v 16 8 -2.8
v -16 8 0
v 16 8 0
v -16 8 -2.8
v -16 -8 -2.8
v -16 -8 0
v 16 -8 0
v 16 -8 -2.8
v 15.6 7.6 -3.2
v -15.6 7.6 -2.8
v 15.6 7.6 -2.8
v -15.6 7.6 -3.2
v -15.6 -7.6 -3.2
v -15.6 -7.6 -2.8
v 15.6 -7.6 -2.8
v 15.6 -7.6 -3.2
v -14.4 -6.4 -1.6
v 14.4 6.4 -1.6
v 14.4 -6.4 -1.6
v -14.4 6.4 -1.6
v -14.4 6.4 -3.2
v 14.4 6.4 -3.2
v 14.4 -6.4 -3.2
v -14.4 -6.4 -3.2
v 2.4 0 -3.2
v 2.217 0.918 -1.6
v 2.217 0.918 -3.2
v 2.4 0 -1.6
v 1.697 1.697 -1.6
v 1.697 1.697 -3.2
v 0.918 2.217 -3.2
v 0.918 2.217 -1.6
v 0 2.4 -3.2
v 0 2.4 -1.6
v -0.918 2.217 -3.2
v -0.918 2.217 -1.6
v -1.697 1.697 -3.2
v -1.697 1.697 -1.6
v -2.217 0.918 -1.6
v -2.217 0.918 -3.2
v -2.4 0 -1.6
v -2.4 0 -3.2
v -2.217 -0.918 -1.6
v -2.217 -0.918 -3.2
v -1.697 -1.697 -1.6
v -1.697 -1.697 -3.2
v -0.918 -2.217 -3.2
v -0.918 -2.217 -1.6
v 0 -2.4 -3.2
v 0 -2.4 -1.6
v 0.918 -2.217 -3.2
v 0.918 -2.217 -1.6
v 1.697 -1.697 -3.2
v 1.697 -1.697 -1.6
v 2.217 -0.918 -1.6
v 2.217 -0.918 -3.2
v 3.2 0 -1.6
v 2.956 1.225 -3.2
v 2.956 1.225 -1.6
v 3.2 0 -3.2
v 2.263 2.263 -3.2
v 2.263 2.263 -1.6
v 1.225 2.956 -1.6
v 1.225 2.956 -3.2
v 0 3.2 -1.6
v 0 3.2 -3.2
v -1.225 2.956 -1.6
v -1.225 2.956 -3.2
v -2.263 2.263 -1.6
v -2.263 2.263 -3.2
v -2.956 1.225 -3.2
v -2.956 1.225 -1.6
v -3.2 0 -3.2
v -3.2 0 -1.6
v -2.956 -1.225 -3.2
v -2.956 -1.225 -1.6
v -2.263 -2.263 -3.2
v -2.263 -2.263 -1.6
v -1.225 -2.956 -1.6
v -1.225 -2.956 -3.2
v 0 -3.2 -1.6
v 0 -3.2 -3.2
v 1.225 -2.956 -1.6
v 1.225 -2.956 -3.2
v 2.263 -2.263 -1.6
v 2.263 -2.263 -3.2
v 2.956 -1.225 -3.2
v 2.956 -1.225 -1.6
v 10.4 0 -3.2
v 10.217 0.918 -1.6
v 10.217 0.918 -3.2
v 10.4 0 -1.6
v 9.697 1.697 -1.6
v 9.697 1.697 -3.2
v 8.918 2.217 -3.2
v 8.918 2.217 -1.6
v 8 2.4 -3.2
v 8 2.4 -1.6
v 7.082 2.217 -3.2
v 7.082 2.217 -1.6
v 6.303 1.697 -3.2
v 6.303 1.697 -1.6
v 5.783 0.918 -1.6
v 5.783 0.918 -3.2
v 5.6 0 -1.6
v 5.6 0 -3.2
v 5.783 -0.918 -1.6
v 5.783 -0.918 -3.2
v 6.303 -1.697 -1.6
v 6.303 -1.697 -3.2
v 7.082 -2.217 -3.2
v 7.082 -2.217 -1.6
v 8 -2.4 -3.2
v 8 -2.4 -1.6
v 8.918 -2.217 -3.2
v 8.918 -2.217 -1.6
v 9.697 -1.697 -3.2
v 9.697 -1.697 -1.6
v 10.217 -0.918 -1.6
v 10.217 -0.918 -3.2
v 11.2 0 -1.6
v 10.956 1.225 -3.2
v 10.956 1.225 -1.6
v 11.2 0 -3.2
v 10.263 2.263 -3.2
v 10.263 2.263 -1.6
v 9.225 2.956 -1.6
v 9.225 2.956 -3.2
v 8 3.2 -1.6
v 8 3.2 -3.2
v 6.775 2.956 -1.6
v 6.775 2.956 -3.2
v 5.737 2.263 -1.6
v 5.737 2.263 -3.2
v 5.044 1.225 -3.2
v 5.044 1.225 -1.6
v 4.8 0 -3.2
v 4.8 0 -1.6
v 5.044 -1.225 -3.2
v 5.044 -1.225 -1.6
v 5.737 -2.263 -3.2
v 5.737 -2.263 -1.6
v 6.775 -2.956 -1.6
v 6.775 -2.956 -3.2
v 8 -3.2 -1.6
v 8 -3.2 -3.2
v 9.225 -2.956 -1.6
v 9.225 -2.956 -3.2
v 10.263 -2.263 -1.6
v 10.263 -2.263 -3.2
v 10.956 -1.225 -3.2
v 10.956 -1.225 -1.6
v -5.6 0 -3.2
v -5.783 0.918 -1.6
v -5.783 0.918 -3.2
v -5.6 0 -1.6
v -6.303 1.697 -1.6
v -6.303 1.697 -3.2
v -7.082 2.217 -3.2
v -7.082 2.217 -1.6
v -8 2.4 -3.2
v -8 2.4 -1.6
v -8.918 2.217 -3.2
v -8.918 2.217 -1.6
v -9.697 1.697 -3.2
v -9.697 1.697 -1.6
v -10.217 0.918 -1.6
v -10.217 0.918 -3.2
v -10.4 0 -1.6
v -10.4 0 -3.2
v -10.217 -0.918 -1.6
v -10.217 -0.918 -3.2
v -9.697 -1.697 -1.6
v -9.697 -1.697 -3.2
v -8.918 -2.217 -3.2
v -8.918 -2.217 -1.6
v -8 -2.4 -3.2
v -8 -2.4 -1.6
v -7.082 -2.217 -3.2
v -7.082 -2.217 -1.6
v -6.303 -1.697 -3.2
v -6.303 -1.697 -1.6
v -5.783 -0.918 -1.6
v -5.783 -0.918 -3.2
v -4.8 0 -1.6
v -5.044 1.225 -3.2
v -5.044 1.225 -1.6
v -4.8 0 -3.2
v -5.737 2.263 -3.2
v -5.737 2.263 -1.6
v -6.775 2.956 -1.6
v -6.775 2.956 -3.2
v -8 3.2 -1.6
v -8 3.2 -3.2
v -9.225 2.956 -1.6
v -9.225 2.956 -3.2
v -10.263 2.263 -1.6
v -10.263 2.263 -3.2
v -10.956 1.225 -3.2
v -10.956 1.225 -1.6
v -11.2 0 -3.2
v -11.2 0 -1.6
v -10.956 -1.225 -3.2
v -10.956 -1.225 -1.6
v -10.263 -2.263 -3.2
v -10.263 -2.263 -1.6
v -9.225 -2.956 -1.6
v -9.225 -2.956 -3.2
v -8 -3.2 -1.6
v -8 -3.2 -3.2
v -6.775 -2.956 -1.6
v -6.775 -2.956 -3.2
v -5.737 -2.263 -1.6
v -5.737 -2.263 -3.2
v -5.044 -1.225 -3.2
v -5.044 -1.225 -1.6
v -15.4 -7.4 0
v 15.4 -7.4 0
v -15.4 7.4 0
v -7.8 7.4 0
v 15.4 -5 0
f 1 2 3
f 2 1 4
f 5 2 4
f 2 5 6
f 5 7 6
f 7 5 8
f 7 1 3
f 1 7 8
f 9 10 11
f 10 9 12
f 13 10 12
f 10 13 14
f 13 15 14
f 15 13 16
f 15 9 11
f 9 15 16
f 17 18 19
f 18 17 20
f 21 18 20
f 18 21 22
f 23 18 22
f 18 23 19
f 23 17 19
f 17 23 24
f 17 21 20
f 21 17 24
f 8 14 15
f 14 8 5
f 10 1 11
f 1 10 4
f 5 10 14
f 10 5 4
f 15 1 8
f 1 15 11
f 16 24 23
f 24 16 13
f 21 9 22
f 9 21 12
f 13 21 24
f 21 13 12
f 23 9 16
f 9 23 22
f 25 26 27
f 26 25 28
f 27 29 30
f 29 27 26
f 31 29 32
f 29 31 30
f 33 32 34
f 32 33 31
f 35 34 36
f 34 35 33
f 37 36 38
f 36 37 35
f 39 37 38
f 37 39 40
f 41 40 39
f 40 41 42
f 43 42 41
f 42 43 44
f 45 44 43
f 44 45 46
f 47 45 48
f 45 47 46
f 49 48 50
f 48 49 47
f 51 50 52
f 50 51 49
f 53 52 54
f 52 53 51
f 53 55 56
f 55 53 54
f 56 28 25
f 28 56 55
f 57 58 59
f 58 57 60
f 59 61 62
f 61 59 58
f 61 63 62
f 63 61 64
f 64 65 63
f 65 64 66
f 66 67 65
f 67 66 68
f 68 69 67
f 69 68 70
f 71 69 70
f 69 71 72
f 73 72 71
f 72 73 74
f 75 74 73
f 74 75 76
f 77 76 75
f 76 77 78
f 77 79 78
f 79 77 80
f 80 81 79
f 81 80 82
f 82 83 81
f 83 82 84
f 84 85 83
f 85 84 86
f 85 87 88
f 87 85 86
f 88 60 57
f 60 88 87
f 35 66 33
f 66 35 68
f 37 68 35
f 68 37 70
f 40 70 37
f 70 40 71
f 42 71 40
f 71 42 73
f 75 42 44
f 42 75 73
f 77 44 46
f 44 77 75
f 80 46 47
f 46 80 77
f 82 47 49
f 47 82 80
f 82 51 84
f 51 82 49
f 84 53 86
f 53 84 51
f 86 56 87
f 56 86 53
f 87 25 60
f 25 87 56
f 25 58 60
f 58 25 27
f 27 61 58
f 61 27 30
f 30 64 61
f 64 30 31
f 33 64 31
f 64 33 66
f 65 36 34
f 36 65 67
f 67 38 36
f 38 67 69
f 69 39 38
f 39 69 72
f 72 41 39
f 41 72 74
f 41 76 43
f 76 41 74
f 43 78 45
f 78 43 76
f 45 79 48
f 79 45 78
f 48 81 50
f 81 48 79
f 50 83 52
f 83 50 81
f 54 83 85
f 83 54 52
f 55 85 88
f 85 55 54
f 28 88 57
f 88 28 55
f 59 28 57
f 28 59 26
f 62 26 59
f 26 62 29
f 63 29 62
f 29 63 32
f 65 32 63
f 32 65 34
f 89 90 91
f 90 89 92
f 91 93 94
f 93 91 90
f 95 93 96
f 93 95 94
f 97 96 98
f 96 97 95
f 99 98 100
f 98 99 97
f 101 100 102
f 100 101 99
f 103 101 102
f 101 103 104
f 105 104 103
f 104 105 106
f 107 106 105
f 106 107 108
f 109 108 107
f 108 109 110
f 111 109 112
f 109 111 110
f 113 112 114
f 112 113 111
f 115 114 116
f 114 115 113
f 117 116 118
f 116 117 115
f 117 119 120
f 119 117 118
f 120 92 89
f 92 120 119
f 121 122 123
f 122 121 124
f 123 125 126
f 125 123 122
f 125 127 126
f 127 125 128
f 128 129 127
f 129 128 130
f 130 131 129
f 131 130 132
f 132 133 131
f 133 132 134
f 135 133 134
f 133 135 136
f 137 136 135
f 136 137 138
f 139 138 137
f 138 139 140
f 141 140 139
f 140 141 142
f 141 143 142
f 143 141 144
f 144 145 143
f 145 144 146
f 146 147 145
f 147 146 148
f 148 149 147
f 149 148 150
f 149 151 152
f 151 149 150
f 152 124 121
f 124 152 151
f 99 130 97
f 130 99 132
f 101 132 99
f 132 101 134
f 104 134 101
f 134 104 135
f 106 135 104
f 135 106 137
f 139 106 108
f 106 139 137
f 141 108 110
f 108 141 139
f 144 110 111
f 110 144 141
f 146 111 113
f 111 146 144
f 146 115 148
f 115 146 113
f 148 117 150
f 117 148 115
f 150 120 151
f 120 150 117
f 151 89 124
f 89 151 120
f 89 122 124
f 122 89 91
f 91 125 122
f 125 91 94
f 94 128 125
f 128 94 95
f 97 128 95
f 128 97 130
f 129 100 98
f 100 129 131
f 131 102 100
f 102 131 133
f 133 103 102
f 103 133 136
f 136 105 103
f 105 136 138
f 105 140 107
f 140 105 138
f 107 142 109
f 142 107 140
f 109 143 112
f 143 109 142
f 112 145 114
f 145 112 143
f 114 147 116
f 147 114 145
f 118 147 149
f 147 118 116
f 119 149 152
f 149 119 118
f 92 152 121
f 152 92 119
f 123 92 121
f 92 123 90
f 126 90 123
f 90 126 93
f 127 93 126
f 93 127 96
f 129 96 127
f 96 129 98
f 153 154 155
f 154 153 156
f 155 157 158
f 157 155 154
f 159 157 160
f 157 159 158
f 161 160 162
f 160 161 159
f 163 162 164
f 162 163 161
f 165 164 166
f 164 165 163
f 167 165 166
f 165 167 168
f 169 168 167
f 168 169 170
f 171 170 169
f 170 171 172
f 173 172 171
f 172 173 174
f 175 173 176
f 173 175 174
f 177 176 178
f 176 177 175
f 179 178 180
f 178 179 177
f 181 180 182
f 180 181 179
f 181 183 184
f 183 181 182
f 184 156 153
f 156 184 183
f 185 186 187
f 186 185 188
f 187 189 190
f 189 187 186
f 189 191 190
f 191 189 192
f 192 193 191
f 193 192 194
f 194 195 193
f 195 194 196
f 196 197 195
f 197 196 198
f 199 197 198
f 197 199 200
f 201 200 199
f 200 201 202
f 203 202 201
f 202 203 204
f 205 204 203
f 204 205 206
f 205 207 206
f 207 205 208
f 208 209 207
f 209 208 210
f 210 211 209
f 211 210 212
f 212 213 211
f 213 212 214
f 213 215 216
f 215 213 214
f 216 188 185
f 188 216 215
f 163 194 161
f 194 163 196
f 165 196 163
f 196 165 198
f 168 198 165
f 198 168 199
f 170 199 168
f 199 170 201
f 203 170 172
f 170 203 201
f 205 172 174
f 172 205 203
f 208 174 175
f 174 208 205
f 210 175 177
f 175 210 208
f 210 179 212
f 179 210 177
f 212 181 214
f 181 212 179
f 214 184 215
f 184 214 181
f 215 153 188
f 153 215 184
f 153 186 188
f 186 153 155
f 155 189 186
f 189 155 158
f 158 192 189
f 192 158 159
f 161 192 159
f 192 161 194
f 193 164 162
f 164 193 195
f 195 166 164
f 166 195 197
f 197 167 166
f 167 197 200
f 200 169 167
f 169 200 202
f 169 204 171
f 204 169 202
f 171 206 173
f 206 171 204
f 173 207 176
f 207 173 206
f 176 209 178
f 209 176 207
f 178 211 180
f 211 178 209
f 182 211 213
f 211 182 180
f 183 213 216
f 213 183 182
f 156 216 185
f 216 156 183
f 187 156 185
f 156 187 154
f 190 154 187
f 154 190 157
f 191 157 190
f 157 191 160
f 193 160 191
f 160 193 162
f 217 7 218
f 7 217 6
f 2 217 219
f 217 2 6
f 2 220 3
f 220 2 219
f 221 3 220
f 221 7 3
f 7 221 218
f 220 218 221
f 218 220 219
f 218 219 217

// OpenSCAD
// file: ../p/4-4ring3.scad
use <../lib.scad>
$fa=1; $fs=0.2;
function ldraw_lib__4_4ring3(realsolid=false) = [
// 0 Ring  3 x 1.0
// 0 Name: 4-4ring3.dat
// 0 Author: James Jessiman
// 0 !LDRAW_ORG Primitive UPDATE 2009-01
// 0 !LICENSE Licensed under CC BY 2.0 and CC BY 4.0 : see CAreadme.txt
// 
// 0 BFC CERTIFY CCW
  [0,"BFC","CERTIFY"],
  [0,"BFC","CCW"],
// 
// 0 !HISTORY 1998-12-15 [PTadmin] Official Update 1998-10
// 0 !HISTORY 2002-04-05 [hafhead] Added BFC statement
// 0 !HISTORY 2002-04-25 [PTadmin] Official Update 2002-02
// 0 !HISTORY 2007-06-24 [PTadmin] Header formatted for Contributor Agreement
// 0 !HISTORY 2008-07-01 [PTadmin] Official Update 2008-01
// 0 !HISTORY 2008-08-26 [cwdee] Switch polygon winding and rename
// 0 !HISTORY 2009-05-02 [PTadmin] Official Update 2009-01
// 
// 
// 4 16 -1.5308 0 3.6956 -1.1481 0 2.7717 0 0 3 0 0 4
  [4,16,-1.5308,0,3.6956,-1.1481,0,2.7717,0,0,3,0,0,4],
// 4 16 -2.8284 0 2.8284 -2.1213 0 2.1213 -1.1481 0 2.7717 -1.5308 0 3.6956
  [4,16,-2.8284,0,2.8284,-2.1213,0,2.1213,-1.1481,0,2.7717,-1.5308,0,3.6956],
// 4 16 -3.6956 0 1.5308 -2.7717 0 1.1481 -2.1213 0 2.1213 -2.8284 0 2.8284
  [4,16,-3.6956,0,1.5308,-2.7717,0,1.1481,-2.1213,0,2.1213,-2.8284,0,2.8284],
// 4 16 -4 0 0 -3 0 0 -2.7717 0 1.1481 -3.6956 0 1.5308
  [4,16,-4,0,0,-3,0,0,-2.7717,0,1.1481,-3.6956,0,1.5308],
// 4 16 -3.6956 0 -1.5308 -2.7717 0 -1.1481 -3 0 0 -4 0 0
  [4,16,-3.6956,0,-1.5308,-2.7717,0,-1.1481,-3,0,0,-4,0,0],
// 4 16 -2.8284 0 -2.8284 -2.1213 0 -2.1213 -2.7717 0 -1.1481 -3.6956 0 -1.5308
  [4,16,-2.8284,0,-2.8284,-2.1213,0,-2.1213,-2.7717,0,-1.1481,-3.6956,0,-1.5308],
// 4 16 -1.5308 0 -3.6956 -1.1481 0 -2.7717 -2.1213 0 -2.1213 -2.8284 0 -2.8284
  [4,16,-1.5308,0,-3.6956,-1.1481,0,-2.7717,-2.1213,0,-2.1213,-2.8284,0,-2.8284],
// 4 16 0 0 -4 0 0 -3 -1.1481 0 -2.7717 -1.5308 0 -3.6956
  [4,16,0,0,-4,0,0,-3,-1.1481,0,-2.7717,-1.5308,0,-3.6956],
// 4 16 1.5308 0 -3.6956 1.1481 0 -2.7717 0 0 -3 0 0 -4
  [4,16,1.5308,0,-3.6956,1.1481,0,-2.7717,0,0,-3,0,0,-4],
// 4 16 2.8284 0 -2.8284 2.1213 0 -2.1213 1.1481 0 -2.7717 1.5308 0 -3.6956
  [4,16,2.8284,0,-2.8284,2.1213,0,-2.1213,1.1481,0,-2.7717,1.5308,0,-3.6956],
// 4 16 3.6956 0 -1.5308 2.7717 0 -1.1481 2.1213 0 -2.1213 2.8284 0 -2.8284
  [4,16,3.6956,0,-1.5308,2.7717,0,-1.1481,2.1213,0,-2.1213,2.8284,0,-2.8284],
// 4 16 4 0 0 3 0 0 2.7717 0 -1.1481 3.6956 0 -1.5308
  [4,16,4,0,0,3,0,0,2.7717,0,-1.1481,3.6956,0,-1.5308],
// 4 16 3.6956 0 1.5308 2.7717 0 1.1481 3 0 0 4 0 0
  [4,16,3.6956,0,1.5308,2.7717,0,1.1481,3,0,0,4,0,0],
// 4 16 2.8284 0 2.8284 2.1213 0 2.1213 2.7717 0 1.1481 3.6956 0 1.5308
  [4,16,2.8284,0,2.8284,2.1213,0,2.1213,2.7717,0,1.1481,3.6956,0,1.5308],
// 4 16 1.5308 0 3.6956 1.1481 0 2.7717 2.1213 0 2.1213 2.8284 0 2.8284
  [4,16,1.5308,0,3.6956,1.1481,0,2.7717,2.1213,0,2.1213,2.8284,0,2.8284],
// 4 16 0 0 4 0 0 3 1.1481 0 2.7717 1.5308 0 3.6956
  [4,16,0,0,4,0,0,3,1.1481,0,2.7717,1.5308,0,3.6956],
// 0
];
module ldraw_lib__4_4ring3(step=0, col=false, unit=2/5, alt=false, line=0.2, solid=!$preview)
    makepoly(ldraw_lib__4_4ring3(solid), step=step, col=col, unit=unit, alt=alt, line=line, solid=solid);
ldraw_lib__4_4ring3(line=0.2);
// file: ../p/4-4edge.scad
use <../lib.scad>
function ldraw_lib__4_4edge() = [
// 0 Circle 1.0
// 0 Name: 4-4edge.dat
// 0 Author: James Jessiman
// 0 !LDRAW_ORG Primitive UPDATE 2017-01
// 0 !LICENSE Licensed under CC BY 2.0 and CC BY 4.0 : see CAreadme.txt
// 
// 0 BFC CERTIFY CCW
  [0,"BFC","CERTIFY"],
  [0,"BFC","CCW"],
// 
// 0 !HISTORY 1998-12-15 [PTadmin] Official Update 1998-10
// 0 !HISTORY 2005-12-28 [PTadmin] Official Update 2005-01
// 0 !HISTORY 2007-06-24 [PTadmin] Header formatted for Contributor Agreement
// 0 !HISTORY 2008-07-01 [PTadmin] Official Update 2008-01
// 0 !HISTORY 2017-01-15 [Steffen] BFCed
// 0 !HISTORY 2017-12-30 [PTadmin] Official Update 2017-01
// 
// 
// 2 24 1 0 0 0.9239 0 0.3827
  [2,24,1,0,0,0.9239,0,0.3827],
// 2 24 0.9239 0 0.3827 0.7071 0 0.7071
  [2,24,0.9239,0,0.3827,0.7071,0,0.7071],
// 2 24 0.7071 0 0.7071 0.3827 0 0.9239
  [2,24,0.7071,0,0.7071,0.3827,0,0.9239],
// 2 24 0.3827 0 0.9239 0 0 1
  [2,24,0.3827,0,0.9239,0,0,1],
// 2 24 0 0 1 -0.3827 0 0.9239
  [2,24,0,0,1,-0.3827,0,0.9239],
// 2 24 -0.3827 0 0.9239 -0.7071 0 0.7071
  [2,24,-0.3827,0,0.9239,-0.7071,0,0.7071],
// 2 24 -0.7071 0 0.7071 -0.9239 0 0.3827
  [2,24,-0.7071,0,0.7071,-0.9239,0,0.3827],
// 2 24 -0.9239 0 0.3827 -1 0 -0
  [2,24,-0.9239,0,0.3827,-1,0,-0],
// 2 24 -1 0 -0 -0.9239 0 -0.3827
  [2,24,-1,0,-0,-0.9239,0,-0.3827],
// 2 24 -0.9239 0 -0.3827 -0.7071 0 -0.7071
  [2,24,-0.9239,0,-0.3827,-0.7071,0,-0.7071],
// 2 24 -0.7071 0 -0.7071 -0.3827 0 -0.9239
  [2,24,-0.7071,0,-0.7071,-0.3827,0,-0.9239],
// 2 24 -0.3827 0 -0.9239 0 0 -1
  [2,24,-0.3827,0,-0.9239,0,0,-1],
// 2 24 0 0 -1 0.3827 0 -0.9239
  [2,24,0,0,-1,0.3827,0,-0.9239],
// 2 24 0.3827 0 -0.9239 0.7071 0 -0.7071
  [2,24,0.3827,0,-0.9239,0.7071,0,-0.7071],
// 2 24 0.7071 0 -0.7071 0.9239 0 -0.3827
  [2,24,0.7071,0,-0.7071,0.9239,0,-0.3827],
// 2 24 0.9239 0 -0.3827 1 0 0
  [2,24,0.9239,0,-0.3827,1,0,0],
];
module ldraw_lib__4_4edge(step=0, col=false, unit=2/5, alt=false, line=0.2, solid=!$preview)
    makepoly(ldraw_lib__4_4edge(), step=step, col=col, unit=unit, alt=alt, line=line, solid=solid);
ldraw_lib__4_4edge(line=0.2);
// file: ../p/4-4cyli.scad
use <../lib.scad>
$fa=1; $fs=0.2;
function ldraw_lib__4_4cyli(realsolid=false) = [
// 0 Cylinder 1.0
// 0 Name: 4-4cyli.dat
// 0 Author: James Jessiman
// 0 !LDRAW_ORG Primitive UPDATE 2005-01
// 0 !LICENSE Licensed under CC BY 2.0 and CC BY 4.0 : see CAreadme.txt
// 
// 0 BFC CERTIFY CCW
  [0,"BFC","CERTIFY"],
  [0,"BFC","CCW"],
// 
// 0 !HISTORY 1998-12-15 [PTadmin] Official Update 1998-10
// 0 !HISTORY 2002-03-23 [sbliss] Added BFC statement; merged headers from files in distributions LDraw 0.27 and Complete.
// 0 !HISTORY 2002-04-25 [PTadmin] Official Update 2002-02
// 0 !HISTORY 2004-12-14 [guyvivan] BFC CCW
// 0 !HISTORY 2005-12-28 [PTadmin] Official Update 2005-01
// 0 !HISTORY 2007-06-24 [PTadmin] Header formatted for Contributor Agreement
// 0 !HISTORY 2008-07-01 [PTadmin] Official Update 2008-01
// 
// 
// 4 16 1 1 0 0.9239 1 0.3827 0.9239 0 0.3827 1 0 0
  [4,16,1,1,0,0.9239,1,0.3827,0.9239,0,0.3827,1,0,0],
// 5 24 1 0 0 1 1 0 0.9239 0 0.3827 0.9239 0 -0.3827
  [5,24,1,0,0,1,1,0,0.9239,0,0.3827,0.9239,0,-0.3827],
// 4 16 0.9239 1 0.3827 0.7071 1 0.7071 0.7071 0 0.7071 0.9239 0 0.3827
  [4,16,0.9239,1,0.3827,0.7071,1,0.7071,0.7071,0,0.7071,0.9239,0,0.3827],
// 5 24 0.9239 0 0.3827 0.9239 1 0.3827 0.7071 0 0.7071 1 0 0
  [5,24,0.9239,0,0.3827,0.9239,1,0.3827,0.7071,0,0.7071,1,0,0],
// 4 16 0.7071 1 0.7071 0.3827 1 0.9239 0.3827 0 0.9239 0.7071 0 0.7071
  [4,16,0.7071,1,0.7071,0.3827,1,0.9239,0.3827,0,0.9239,0.7071,0,0.7071],
// 5 24 0.7071 0 0.7071 0.7071 1 0.7071 0.3827 0 0.9239 0.9239 0 0.3827
  [5,24,0.7071,0,0.7071,0.7071,1,0.7071,0.3827,0,0.9239,0.9239,0,0.3827],
// 4 16 0.3827 1 0.9239 0 1 1 0 0 1 0.3827 0 0.9239
  [4,16,0.3827,1,0.9239,0,1,1,0,0,1,0.3827,0,0.9239],
// 5 24 0.3827 0 0.9239 0.3827 1 0.9239 0 0 1 0.7071 0 0.7071
  [5,24,0.3827,0,0.9239,0.3827,1,0.9239,0,0,1,0.7071,0,0.7071],
// 4 16 0 1 1 -0.3827 1 0.9239 -0.3827 0 0.9239 0 0 1
  [4,16,0,1,1,-0.3827,1,0.9239,-0.3827,0,0.9239,0,0,1],
// 5 24 0 0 1 0 1 1 -0.3827 0 0.9239 0.3827 0 0.9239
  [5,24,0,0,1,0,1,1,-0.3827,0,0.9239,0.3827,0,0.9239],
// 4 16 -0.3827 1 0.9239 -0.7071 1 0.7071 -0.7071 0 0.7071 -0.3827 0 0.9239
  [4,16,-0.3827,1,0.9239,-0.7071,1,0.7071,-0.7071,0,0.7071,-0.3827,0,0.9239],
// 5 24 -0.3827 0 0.9239 -0.3827 1 0.9239 -0.7071 0 0.7071 0 0 1
  [5,24,-0.3827,0,0.9239,-0.3827,1,0.9239,-0.7071,0,0.7071,0,0,1],
// 4 16 -0.7071 1 0.7071 -0.9239 1 0.3827 -0.9239 0 0.3827 -0.7071 0 0.7071
  [4,16,-0.7071,1,0.7071,-0.9239,1,0.3827,-0.9239,0,0.3827,-0.7071,0,0.7071],
// 5 24 -0.7071 0 0.7071 -0.7071 1 0.7071 -0.9239 0 0.3827 -0.3827 0 0.9239
  [5,24,-0.7071,0,0.7071,-0.7071,1,0.7071,-0.9239,0,0.3827,-0.3827,0,0.9239],
// 4 16 -0.9239 1 0.3827 -1 1 0 -1 0 0 -0.9239 0 0.3827
  [4,16,-0.9239,1,0.3827,-1,1,0,-1,0,0,-0.9239,0,0.3827],
// 5 24 -0.9239 0 0.3827 -0.9239 1 0.3827 -1 0 0 -0.7071 0 0.7071
  [5,24,-0.9239,0,0.3827,-0.9239,1,0.3827,-1,0,0,-0.7071,0,0.7071],
// 4 16 -1 1 0 -0.9239 1 -0.3827 -0.9239 0 -0.3827 -1 0 0
  [4,16,-1,1,0,-0.9239,1,-0.3827,-0.9239,0,-0.3827,-1,0,0],
// 5 24 -1 0 0 -1 1 0 -0.9239 0 -0.3827 -0.9239 0 0.3827
  [5,24,-1,0,0,-1,1,0,-0.9239,0,-0.3827,-0.9239,0,0.3827],
// 4 16 -0.9239 1 -0.3827 -0.7071 1 -0.7071 -0.7071 0 -0.7071 -0.9239 0 -0.3827
  [4,16,-0.9239,1,-0.3827,-0.7071,1,-0.7071,-0.7071,0,-0.7071,-0.9239,0,-0.3827],
// 5 24 -0.9239 0 -0.3827 -0.9239 1 -0.3827 -0.7071 0 -0.7071 -1 0 0
  [5,24,-0.9239,0,-0.3827,-0.9239,1,-0.3827,-0.7071,0,-0.7071,-1,0,0],
// 4 16 -0.7071 1 -0.7071 -0.3827 1 -0.9239 -0.3827 0 -0.9239 -0.7071 0 -0.7071
  [4,16,-0.7071,1,-0.7071,-0.3827,1,-0.9239,-0.3827,0,-0.9239,-0.7071,0,-0.7071],
// 5 24 -0.7071 0 -0.7071 -0.7071 1 -0.7071 -0.3827 0 -0.9239 -0.9239 0 -0.3827
  [5,24,-0.7071,0,-0.7071,-0.7071,1,-0.7071,-0.3827,0,-0.9239,-0.9239,0,-0.3827],
// 4 16 -0.3827 1 -0.9239 0 1 -1 0 0 -1 -0.3827 0 -0.9239
  [4,16,-0.3827,1,-0.9239,0,1,-1,0,0,-1,-0.3827,0,-0.9239],
// 5 24 -0.3827 0 -0.9239 -0.3827 1 -0.9239 0 0 -1 -0.7071 0 -0.7071
  [5,24,-0.3827,0,-0.9239,-0.3827,1,-0.9239,0,0,-1,-0.7071,0,-0.7071],
// 4 16 0 1 -1 0.3827 1 -0.9239 0.3827 0 -0.9239 0 0 -1
  [4,16,0,1,-1,0.3827,1,-0.9239,0.3827,0,-0.9239,0,0,-1],
// 5 24 0 0 -1 0 1 -1 0.3827 0 -0.9239 -0.3827 0 -0.9239
  [5,24,0,0,-1,0,1,-1,0.3827,0,-0.9239,-0.3827,0,-0.9239],
// 4 16 0.3827 1 -0.9239 0.7071 1 -0.7071 0.7071 0 -0.7071 0.3827 0 -0.9239
  [4,16,0.3827,1,-0.9239,0.7071,1,-0.7071,0.7071,0,-0.7071,0.3827,0,-0.9239],
// 5 24 0.3827 0 -0.9239 0.3827 1 -0.9239 0.7071 0 -0.7071 0 0 -1
  [5,24,0.3827,0,-0.9239,0.3827,1,-0.9239,0.7071,0,-0.7071,0,0,-1],
// 4 16 0.7071 1 -0.7071 0.9239 1 -0.3827 0.9239 0 -0.3827 0.7071 0 -0.7071
  [4,16,0.7071,1,-0.7071,0.9239,1,-0.3827,0.9239,0,-0.3827,0.7071,0,-0.7071],
// 5 24 0.7071 0 -0.7071 0.7071 1 -0.7071 0.9239 0 -0.3827 0.3827 0 -0.9239
  [5,24,0.7071,0,-0.7071,0.7071,1,-0.7071,0.9239,0,-0.3827,0.3827,0,-0.9239],
// 4 16 0.9239 1 -0.3827 1 1 0 1 0 0 0.9239 0 -0.3827
  [4,16,0.9239,1,-0.3827,1,1,0,1,0,0,0.9239,0,-0.3827],
// 5 24 0.9239 0 -0.3827 0.9239 1 -0.3827 1 0 0 0.7071 0 -0.7071
  [5,24,0.9239,0,-0.3827,0.9239,1,-0.3827,1,0,0,0.7071,0,-0.7071],
// 0
];
module ldraw_lib__4_4cyli(step=0, col=false, unit=2/5, alt=false, line=0.2, solid=!$preview)
    makepoly(ldraw_lib__4_4cyli(solid), step=step, col=col, unit=unit, alt=alt, line=line, solid=solid);
ldraw_lib__4_4cyli(line=0.2);
// file: ../p/stud4.scad
use <../lib.scad>
use <4-4cyli.scad>
use <4-4edge.scad>
use <4-4ring3.scad>
function ldraw_lib__stud4() = [
// 0 Stud Tube Open
// 0 Name: stud4.dat
// 0 Author: James Jessiman
// 0 !LDRAW_ORG Primitive UPDATE 2009-02
// 0 !LICENSE Licensed under CC BY 4.0 : see CAreadme.txt
// 
// 0 BFC CERTIFY CCW
  [0,"BFC","CERTIFY"],
  [0,"BFC","CCW"],
// 
// 0 !HISTORY 1999-07-05 [PTadmin] Official Update 1999-05
// 0 !HISTORY 2002-04-04 [sbliss] Modified for BFC compliance
// 0 !HISTORY 2002-04-25 [PTadmin] Official Update 2002-02
// 0 !HISTORY 2007-06-24 [PTadmin] Header formatted for Contributor Agreement
// 0 !HISTORY 2008-07-01 [PTadmin] Official Update 2008-01
// 0 !HISTORY 2009-06-21 [cwdee] Update ring references to 4-4ring
// 0 !HISTORY 2009-09-03 [PTadmin] Official Update 2009-02
// 
// 
// 1 16 0 -4 0 6 0 0 0 1 0 0 0 6 4-4edge.dat
  [1,16,0,-4,0,6,0,0,0,1,0,0,0,6, ldraw_lib__4_4edge()],
// 1 16 0 -4 0 8 0 0 0 1 0 0 0 8 4-4edge.dat
  [1,16,0,-4,0,8,0,0,0,1,0,0,0,8, ldraw_lib__4_4edge()],
// 1 16 0 0 0 6 0 0 0 1 0 0 0 6 4-4edge.dat
  [1,16,0,0,0,6,0,0,0,1,0,0,0,6, ldraw_lib__4_4edge()],
// 1 16 0 0 0 8 0 0 0 1 0 0 0 8 4-4edge.dat
  [1,16,0,0,0,8,0,0,0,1,0,0,0,8, ldraw_lib__4_4edge()],
// 0 BFC INVERTNEXT
  [0,"BFC","INVERTNEXT"],
// 1 16 0 -4 0 6 0 0 0 4 0 0 0 6 4-4cyli.dat
  [1,16,0,-4,0,6,0,0,0,4,0,0,0,6, ldraw_lib__4_4cyli()],
// 1 16 0 -4 0 8 0 0 0 4 0 0 0 8 4-4cyli.dat
  [1,16,0,-4,0,8,0,0,0,4,0,0,0,8, ldraw_lib__4_4cyli()],
// 1 16 0 -4 0 2 0 0 0 1 0 0 0 2 4-4ring3.dat
  [1,16,0,-4,0,2,0,0,0,1,0,0,0,2, ldraw_lib__4_4ring3()],
  [-1,16,0,0,0,2,0,0,0,-1,0,0,0,2, ldraw_lib__4_4ring3()],
// 0
];
module ldraw_lib__stud4(step=0, col=false, unit=2/5, alt=false, line=0.2, solid=!$preview)
    makepoly(ldraw_lib__stud4(), step=step, col=col, unit=unit, alt=alt, line=line, solid=solid);
ldraw_lib__stud4(line=0.2);
// file: ../p/box5.scad
use <../lib.scad>
function ldraw_lib__box5() = [
// 0 Box with 5 Faces and All Edges
// 0 Name: box5.dat
// 0 Author: James Jessiman
// 0 !LDRAW_ORG Primitive UPDATE 2012-01
// 0 !LICENSE Licensed under CC BY 2.0 and CC BY 4.0 : see CAreadme.txt
// 
// 0 BFC CERTIFY CCW
  [0,"BFC","CERTIFY"],
  [0,"BFC","CCW"],
// 
// 0 !HISTORY 2002-04-03 [sbliss] Modified for BFC compliance
// 0 !HISTORY 2002-04-25 [PTadmin] Official Update 2002-02
// 0 !HISTORY 2007-06-24 [PTadmin] Header formatted for Contributor Agreement
// 0 !HISTORY 2008-07-01 [PTadmin] Official Update 2008-01
// 0 !HISTORY 2012-02-16 [Philo] Changed to CCW
// 0 !HISTORY 2012-03-30 [PTadmin] Official Update 2012-01
// 
// 
// 2 24 1 1 1 -1 1 1
  [2,24,1,1,1,-1,1,1],
// 2 24 -1 1 1 -1 1 -1
  [2,24,-1,1,1,-1,1,-1],
// 2 24 -1 1 -1 1 1 -1
  [2,24,-1,1,-1,1,1,-1],
// 2 24 1 1 -1 1 1 1
  [2,24,1,1,-1,1,1,1],
// 2 24 1 0 1 -1 0 1
  [2,24,1,0,1,-1,0,1],
// 2 24 -1 0 1 -1 0 -1
  [2,24,-1,0,1,-1,0,-1],
// 2 24 -1 0 -1 1 0 -1
  [2,24,-1,0,-1,1,0,-1],
// 2 24 1 0 -1 1 0 1
  [2,24,1,0,-1,1,0,1],
// 2 24 1 0 1 1 1 1
  [2,24,1,0,1,1,1,1],
// 2 24 -1 0 1 -1 1 1
  [2,24,-1,0,1,-1,1,1],
// 2 24 1 0 -1 1 1 -1
  [2,24,1,0,-1,1,1,-1],
// 2 24 -1 0 -1 -1 1 -1
  [2,24,-1,0,-1,-1,1,-1],
// 4 16 -1 1 1 1 1 1 1 1 -1 -1 1 -1
  [4,16,-1,1,1,1,1,1,1,1,-1,-1,1,-1],
// 4 16 -1 1 1 -1 0 1 1 0 1 1 1 1
  [4,16,-1,1,1,-1,0,1,1,0,1,1,1,1],
// 4 16 -1 1 -1 -1 0 -1 -1 0 1 -1 1 1
  [4,16,-1,1,-1,-1,0,-1,-1,0,1,-1,1,1],
// 4 16 1 1 -1 1 0 -1 -1 0 -1 -1 1 -1
  [4,16,1,1,-1,1,0,-1,-1,0,-1,-1,1,-1],
// 4 16 1 1 1 1 0 1 1 0 -1 1 1 -1
  [4,16,1,1,1,1,0,1,1,0,-1,1,1,-1],
];
makepoly(ldraw_lib__box5(), line=0.2);
// file: ../p/box4.scad
use <../lib.scad>
function ldraw_lib__box4() = [
// 0 Box with 4 Faces (2 Parallel Pairs) and All Edges
// 0 Name: box4.dat
// 0 Author: James Jessiman
// 0 !LDRAW_ORG Primitive UPDATE 2012-01
// 0 !LICENSE Licensed under CC BY 4.0 : see CAreadme.txt
// 
// 0 BFC CERTIFY CCW
  [0,"BFC","CERTIFY"],
  [0,"BFC","CCW"],
// 
// 0 !HISTORY 2002-04-03 [sbliss] Modified for BFC compliance
// 0 !HISTORY 2002-04-25 [PTadmin] Official Update 2002-02
// 0 !HISTORY 2007-06-24 [PTadmin] Header formatted for Contributor Agreement
// 0 !HISTORY 2008-07-01 [PTadmin] Official Update 2008-01
// 0 !HISTORY 2012-02-16 [Philo] Changed to CCW
// 0 !HISTORY 2012-03-30 [PTadmin] Official Update 2012-01
// 
// 
// 2 24 1 1 1 -1 1 1
  [2,24,1,1,1,-1,1,1],
// 2 24 -1 1 1 -1 1 -1
  [2,24,-1,1,1,-1,1,-1],
// 2 24 -1 1 -1 1 1 -1
  [2,24,-1,1,-1,1,1,-1],
// 2 24 1 1 -1 1 1 1
  [2,24,1,1,-1,1,1,1],
// 2 24 1 0 1 -1 0 1
  [2,24,1,0,1,-1,0,1],
// 2 24 -1 0 1 -1 0 -1
  [2,24,-1,0,1,-1,0,-1],
// 2 24 -1 0 -1 1 0 -1
  [2,24,-1,0,-1,1,0,-1],
// 2 24 1 0 -1 1 0 1
  [2,24,1,0,-1,1,0,1],
// 2 24 1 0 1 1 1 1
  [2,24,1,0,1,1,1,1],
// 2 24 -1 0 1 -1 1 1
  [2,24,-1,0,1,-1,1,1],
// 2 24 1 0 -1 1 1 -1
  [2,24,1,0,-1,1,1,-1],
// 2 24 -1 0 -1 -1 1 -1
  [2,24,-1,0,-1,-1,1,-1],
// 4 16 -1 1 1 -1 0 1 1 0 1 1 1 1
  [4,16,-1,1,1,-1,0,1,1,0,1,1,1,1],
// 4 16 -1 1 -1 -1 0 -1 -1 0 1 -1 1 1
  [4,16,-1,1,-1,-1,0,-1,-1,0,1,-1,1,1],
// 4 16 1 1 -1 1 0 -1 -1 0 -1 -1 1 -1
  [4,16,1,1,-1,1,0,-1,-1,0,-1,-1,1,-1],
// 4 16 1 1 1 1 0 1 1 0 -1 1 1 -1
  [4,16,1,1,1,1,0,1,1,0,-1,1,1,-1],
];
module ldraw_lib__box4(step=0, col=false, unit=2/5, alt=false, line=0.2, solid=!$preview)
    makepoly(ldraw_lib__box4(), step=step, col=col, unit=unit, alt=alt, line=line, solid=solid);
ldraw_lib__box4(line=0.2);
// file: s/87079s01.scad
use <../../lib.scad>
use <../../p/box4.scad>
use <../../p/box5.scad>
use <../../p/stud4.scad>
function ldraw_lib__s__87079s01() = [
// 0 ~Tile  2 x  4 without Top Surface
// 0 Name: s\87079s01.dat
// 0 Author: Philippe Hurbain [Philo]
// 0 !LDRAW_ORG Subpart UPDATE 2025-04
// 0 !LICENSE Licensed under CC BY 4.0 : see CAreadme.txt
// 
// 0 BFC CERTIFY CCW
  [0,"BFC","CERTIFY"],
  [0,"BFC","CCW"],
// 
// 0 !HISTORY 2012-09-30 [Philo] Subparted from Tim Gould's original design
// 0 !HISTORY 2012-12-28 [PTadmin] Official Update 2012-03
// 0 !HISTORY 2025-04-25 [MagFors] Update description
// 0 !HISTORY 2025-04-27 [OrionP] Official Update 2025-04
// 
// 1 16 0 0 0 40 0 0 0 7 0 0 0 20 box4.dat
  [1,16,0,0,0,40,0,0,0,7,0,0,0,20, ldraw_lib__box4()],
// 1 16 0 7 0 39 0 0 0 1 0 0 0 19 box4.dat
  [1,16,0,7,0,39,0,0,0,1,0,0,0,19, ldraw_lib__box4()],
// 0 BFC INVERTNEXT
  [0,"BFC","INVERTNEXT"],
// 1 16 0 8 0 -36 0 0 0 -4 0 0 0 16 box5.dat
  [1,16,0,8,0,-36,0,0,0,-4,0,0,0,16, ldraw_lib__box5()],
// 4 16 -40 7 -20 -39 7 -19 39 7 -19 40 7 -20
  [4,16,-40,7,-20,-39,7,-19,39,7,-19,40,7,-20],
// 4 16 40 7 20 39 7 19 -39 7 19 -40 7 20
  [4,16,40,7,20,39,7,19,-39,7,19,-40,7,20],
// 4 16 -40 7 -20 -40 7 20 -39 7 19 -39 7 -19
  [4,16,-40,7,-20,-40,7,20,-39,7,19,-39,7,-19],
// 4 16 40 7 20 40 7 -20 39 7 -19 39 7 19
  [4,16,40,7,20,40,7,-20,39,7,-19,39,7,19],
// 4 16 -39 8 -19 -36 8 -16 36 8 -16 39 8 -19
  [4,16,-39,8,-19,-36,8,-16,36,8,-16,39,8,-19],
// 4 16 39 8 19 36 8 16 -36 8 16 -39 8 19
  [4,16,39,8,19,36,8,16,-36,8,16,-39,8,19],
// 4 16 -39 8 -19 -39 8 19 -36 8 16 -36 8 -16
  [4,16,-39,8,-19,-39,8,19,-36,8,16,-36,8,-16],
// 4 16 39 8 19 39 8 -19 36 8 -16 36 8 16
  [4,16,39,8,19,39,8,-19,36,8,-16,36,8,16],
// 1 16 0 4 0 1 0 0 0 -1 0 0 0 1 stud4.dat
  [1,16,0,4,0,1,0,0,0,-1,0,0,0,1, ldraw_lib__stud4()],
// 1 16 20 4 0 1 0 0 0 -1 0 0 0 1 stud4.dat
  [1,16,20,4,0,1,0,0,0,-1,0,0,0,1, ldraw_lib__stud4()],
// 1 16 -20 4 0 1 0 0 0 -1 0 0 0 1 stud4.dat
  [1,16,-20,4,0,1,0,0,0,-1,0,0,0,1, ldraw_lib__stud4()],
];
module ldraw_lib__s__87079s01(step=0, col=false, unit=2/5, alt=false, line=0.2, solid=!$preview)
    makepoly(ldraw_lib__s__87079s01(), step=step, col=col, unit=unit, alt=alt, line=line, solid=solid);
ldraw_lib__s__87079s01(line=0.2);
// main file
use <../lib.scad>
use <s/87079s01.scad>
function ldraw_lib__87079px5() = [
// 0 Tile  2 x  4 with Black Triangle on Bottom Left and Red Diagonal Stripe Pattern
// 0 Name: 87079px5.dat
// 0 Author: Gerald Lasser [GeraldLasser]
// 0 !LDRAW_ORG Part UPDATE 2020-03
// 0 !LICENSE Licensed under CC BY 4.0 : see CAreadme.txt
// 
// 0 BFC CERTIFY CCW
  [0,"BFC","CERTIFY"],
  [0,"BFC","CCW"],
// 
// 0 !KEYWORDS A-Team, BrickLink 87079pb0343R, Lego Dimensions
// 0 !KEYWORDS Rebrickable 87079pr0096, Set 71251
// 
// 0 !HISTORY 2020-12-29 [PTadmin] Official Update 2020-03
// 
// 
// 1 16 0 0 0 1 0 0 0 1 0 0 0 1 s\87079s01.dat
  [1,16,0,0,0,1,0,0,0,1,0,0,0,1, ldraw_lib__s__87079s01()],
// 
// 4 16 40 0 -20 38.5 0 -18.5 -38.5 0 -18.5 -40 0 -20
  [4,16,40,0,-20,38.5,0,-18.5,-38.5,0,-18.5,-40,0,-20],
// 4 16 -40 0 20 -40 0 -20 -38.5 0 -18.5 -38.5 0 18.5
  [4,16,-40,0,20,-40,0,-20,-38.5,0,-18.5,-38.5,0,18.5],
// 4 16 -40 0 20 -38.5 0 18.5 -19.5 0 18.5 40 0 20
  [4,16,-40,0,20,-38.5,0,18.5,-19.5,0,18.5,40,0,20],
// 3 16 38.5 0 -12.5 40 0 20 -19.5 0 18.5
  [3,16,38.5,0,-12.5,40,0,20,-19.5,0,18.5],
// 4 16 40 0 -20 40 0 20 38.5 0 -12.5 38.5 0 -18.5
  [4,16,40,0,-20,40,0,20,38.5,0,-12.5,38.5,0,-18.5],
// 4 4 38.5 0 -18.5 38.5 0 -12.5 -19.5 0 18.5 -38.5 0 18.5
  [4,4,38.5,0,-18.5,38.5,0,-12.5,-19.5,0,18.5,-38.5,0,18.5],
// 3 0 38.5 0 -18.5 -38.5 0 18.5 -38.5 0 -18.5
  [3,0,38.5,0,-18.5,-38.5,0,18.5,-38.5,0,-18.5],
];
module ldraw_lib__87079px5(step=0, col=false, unit=2/5, alt=false, line=0.2, solid=!$preview)
    makepoly(ldraw_lib__87079px5(), step=step, col=col, unit=unit, alt=alt, line=line, solid=solid);
ldraw_lib__87079px5(line=0.2);
